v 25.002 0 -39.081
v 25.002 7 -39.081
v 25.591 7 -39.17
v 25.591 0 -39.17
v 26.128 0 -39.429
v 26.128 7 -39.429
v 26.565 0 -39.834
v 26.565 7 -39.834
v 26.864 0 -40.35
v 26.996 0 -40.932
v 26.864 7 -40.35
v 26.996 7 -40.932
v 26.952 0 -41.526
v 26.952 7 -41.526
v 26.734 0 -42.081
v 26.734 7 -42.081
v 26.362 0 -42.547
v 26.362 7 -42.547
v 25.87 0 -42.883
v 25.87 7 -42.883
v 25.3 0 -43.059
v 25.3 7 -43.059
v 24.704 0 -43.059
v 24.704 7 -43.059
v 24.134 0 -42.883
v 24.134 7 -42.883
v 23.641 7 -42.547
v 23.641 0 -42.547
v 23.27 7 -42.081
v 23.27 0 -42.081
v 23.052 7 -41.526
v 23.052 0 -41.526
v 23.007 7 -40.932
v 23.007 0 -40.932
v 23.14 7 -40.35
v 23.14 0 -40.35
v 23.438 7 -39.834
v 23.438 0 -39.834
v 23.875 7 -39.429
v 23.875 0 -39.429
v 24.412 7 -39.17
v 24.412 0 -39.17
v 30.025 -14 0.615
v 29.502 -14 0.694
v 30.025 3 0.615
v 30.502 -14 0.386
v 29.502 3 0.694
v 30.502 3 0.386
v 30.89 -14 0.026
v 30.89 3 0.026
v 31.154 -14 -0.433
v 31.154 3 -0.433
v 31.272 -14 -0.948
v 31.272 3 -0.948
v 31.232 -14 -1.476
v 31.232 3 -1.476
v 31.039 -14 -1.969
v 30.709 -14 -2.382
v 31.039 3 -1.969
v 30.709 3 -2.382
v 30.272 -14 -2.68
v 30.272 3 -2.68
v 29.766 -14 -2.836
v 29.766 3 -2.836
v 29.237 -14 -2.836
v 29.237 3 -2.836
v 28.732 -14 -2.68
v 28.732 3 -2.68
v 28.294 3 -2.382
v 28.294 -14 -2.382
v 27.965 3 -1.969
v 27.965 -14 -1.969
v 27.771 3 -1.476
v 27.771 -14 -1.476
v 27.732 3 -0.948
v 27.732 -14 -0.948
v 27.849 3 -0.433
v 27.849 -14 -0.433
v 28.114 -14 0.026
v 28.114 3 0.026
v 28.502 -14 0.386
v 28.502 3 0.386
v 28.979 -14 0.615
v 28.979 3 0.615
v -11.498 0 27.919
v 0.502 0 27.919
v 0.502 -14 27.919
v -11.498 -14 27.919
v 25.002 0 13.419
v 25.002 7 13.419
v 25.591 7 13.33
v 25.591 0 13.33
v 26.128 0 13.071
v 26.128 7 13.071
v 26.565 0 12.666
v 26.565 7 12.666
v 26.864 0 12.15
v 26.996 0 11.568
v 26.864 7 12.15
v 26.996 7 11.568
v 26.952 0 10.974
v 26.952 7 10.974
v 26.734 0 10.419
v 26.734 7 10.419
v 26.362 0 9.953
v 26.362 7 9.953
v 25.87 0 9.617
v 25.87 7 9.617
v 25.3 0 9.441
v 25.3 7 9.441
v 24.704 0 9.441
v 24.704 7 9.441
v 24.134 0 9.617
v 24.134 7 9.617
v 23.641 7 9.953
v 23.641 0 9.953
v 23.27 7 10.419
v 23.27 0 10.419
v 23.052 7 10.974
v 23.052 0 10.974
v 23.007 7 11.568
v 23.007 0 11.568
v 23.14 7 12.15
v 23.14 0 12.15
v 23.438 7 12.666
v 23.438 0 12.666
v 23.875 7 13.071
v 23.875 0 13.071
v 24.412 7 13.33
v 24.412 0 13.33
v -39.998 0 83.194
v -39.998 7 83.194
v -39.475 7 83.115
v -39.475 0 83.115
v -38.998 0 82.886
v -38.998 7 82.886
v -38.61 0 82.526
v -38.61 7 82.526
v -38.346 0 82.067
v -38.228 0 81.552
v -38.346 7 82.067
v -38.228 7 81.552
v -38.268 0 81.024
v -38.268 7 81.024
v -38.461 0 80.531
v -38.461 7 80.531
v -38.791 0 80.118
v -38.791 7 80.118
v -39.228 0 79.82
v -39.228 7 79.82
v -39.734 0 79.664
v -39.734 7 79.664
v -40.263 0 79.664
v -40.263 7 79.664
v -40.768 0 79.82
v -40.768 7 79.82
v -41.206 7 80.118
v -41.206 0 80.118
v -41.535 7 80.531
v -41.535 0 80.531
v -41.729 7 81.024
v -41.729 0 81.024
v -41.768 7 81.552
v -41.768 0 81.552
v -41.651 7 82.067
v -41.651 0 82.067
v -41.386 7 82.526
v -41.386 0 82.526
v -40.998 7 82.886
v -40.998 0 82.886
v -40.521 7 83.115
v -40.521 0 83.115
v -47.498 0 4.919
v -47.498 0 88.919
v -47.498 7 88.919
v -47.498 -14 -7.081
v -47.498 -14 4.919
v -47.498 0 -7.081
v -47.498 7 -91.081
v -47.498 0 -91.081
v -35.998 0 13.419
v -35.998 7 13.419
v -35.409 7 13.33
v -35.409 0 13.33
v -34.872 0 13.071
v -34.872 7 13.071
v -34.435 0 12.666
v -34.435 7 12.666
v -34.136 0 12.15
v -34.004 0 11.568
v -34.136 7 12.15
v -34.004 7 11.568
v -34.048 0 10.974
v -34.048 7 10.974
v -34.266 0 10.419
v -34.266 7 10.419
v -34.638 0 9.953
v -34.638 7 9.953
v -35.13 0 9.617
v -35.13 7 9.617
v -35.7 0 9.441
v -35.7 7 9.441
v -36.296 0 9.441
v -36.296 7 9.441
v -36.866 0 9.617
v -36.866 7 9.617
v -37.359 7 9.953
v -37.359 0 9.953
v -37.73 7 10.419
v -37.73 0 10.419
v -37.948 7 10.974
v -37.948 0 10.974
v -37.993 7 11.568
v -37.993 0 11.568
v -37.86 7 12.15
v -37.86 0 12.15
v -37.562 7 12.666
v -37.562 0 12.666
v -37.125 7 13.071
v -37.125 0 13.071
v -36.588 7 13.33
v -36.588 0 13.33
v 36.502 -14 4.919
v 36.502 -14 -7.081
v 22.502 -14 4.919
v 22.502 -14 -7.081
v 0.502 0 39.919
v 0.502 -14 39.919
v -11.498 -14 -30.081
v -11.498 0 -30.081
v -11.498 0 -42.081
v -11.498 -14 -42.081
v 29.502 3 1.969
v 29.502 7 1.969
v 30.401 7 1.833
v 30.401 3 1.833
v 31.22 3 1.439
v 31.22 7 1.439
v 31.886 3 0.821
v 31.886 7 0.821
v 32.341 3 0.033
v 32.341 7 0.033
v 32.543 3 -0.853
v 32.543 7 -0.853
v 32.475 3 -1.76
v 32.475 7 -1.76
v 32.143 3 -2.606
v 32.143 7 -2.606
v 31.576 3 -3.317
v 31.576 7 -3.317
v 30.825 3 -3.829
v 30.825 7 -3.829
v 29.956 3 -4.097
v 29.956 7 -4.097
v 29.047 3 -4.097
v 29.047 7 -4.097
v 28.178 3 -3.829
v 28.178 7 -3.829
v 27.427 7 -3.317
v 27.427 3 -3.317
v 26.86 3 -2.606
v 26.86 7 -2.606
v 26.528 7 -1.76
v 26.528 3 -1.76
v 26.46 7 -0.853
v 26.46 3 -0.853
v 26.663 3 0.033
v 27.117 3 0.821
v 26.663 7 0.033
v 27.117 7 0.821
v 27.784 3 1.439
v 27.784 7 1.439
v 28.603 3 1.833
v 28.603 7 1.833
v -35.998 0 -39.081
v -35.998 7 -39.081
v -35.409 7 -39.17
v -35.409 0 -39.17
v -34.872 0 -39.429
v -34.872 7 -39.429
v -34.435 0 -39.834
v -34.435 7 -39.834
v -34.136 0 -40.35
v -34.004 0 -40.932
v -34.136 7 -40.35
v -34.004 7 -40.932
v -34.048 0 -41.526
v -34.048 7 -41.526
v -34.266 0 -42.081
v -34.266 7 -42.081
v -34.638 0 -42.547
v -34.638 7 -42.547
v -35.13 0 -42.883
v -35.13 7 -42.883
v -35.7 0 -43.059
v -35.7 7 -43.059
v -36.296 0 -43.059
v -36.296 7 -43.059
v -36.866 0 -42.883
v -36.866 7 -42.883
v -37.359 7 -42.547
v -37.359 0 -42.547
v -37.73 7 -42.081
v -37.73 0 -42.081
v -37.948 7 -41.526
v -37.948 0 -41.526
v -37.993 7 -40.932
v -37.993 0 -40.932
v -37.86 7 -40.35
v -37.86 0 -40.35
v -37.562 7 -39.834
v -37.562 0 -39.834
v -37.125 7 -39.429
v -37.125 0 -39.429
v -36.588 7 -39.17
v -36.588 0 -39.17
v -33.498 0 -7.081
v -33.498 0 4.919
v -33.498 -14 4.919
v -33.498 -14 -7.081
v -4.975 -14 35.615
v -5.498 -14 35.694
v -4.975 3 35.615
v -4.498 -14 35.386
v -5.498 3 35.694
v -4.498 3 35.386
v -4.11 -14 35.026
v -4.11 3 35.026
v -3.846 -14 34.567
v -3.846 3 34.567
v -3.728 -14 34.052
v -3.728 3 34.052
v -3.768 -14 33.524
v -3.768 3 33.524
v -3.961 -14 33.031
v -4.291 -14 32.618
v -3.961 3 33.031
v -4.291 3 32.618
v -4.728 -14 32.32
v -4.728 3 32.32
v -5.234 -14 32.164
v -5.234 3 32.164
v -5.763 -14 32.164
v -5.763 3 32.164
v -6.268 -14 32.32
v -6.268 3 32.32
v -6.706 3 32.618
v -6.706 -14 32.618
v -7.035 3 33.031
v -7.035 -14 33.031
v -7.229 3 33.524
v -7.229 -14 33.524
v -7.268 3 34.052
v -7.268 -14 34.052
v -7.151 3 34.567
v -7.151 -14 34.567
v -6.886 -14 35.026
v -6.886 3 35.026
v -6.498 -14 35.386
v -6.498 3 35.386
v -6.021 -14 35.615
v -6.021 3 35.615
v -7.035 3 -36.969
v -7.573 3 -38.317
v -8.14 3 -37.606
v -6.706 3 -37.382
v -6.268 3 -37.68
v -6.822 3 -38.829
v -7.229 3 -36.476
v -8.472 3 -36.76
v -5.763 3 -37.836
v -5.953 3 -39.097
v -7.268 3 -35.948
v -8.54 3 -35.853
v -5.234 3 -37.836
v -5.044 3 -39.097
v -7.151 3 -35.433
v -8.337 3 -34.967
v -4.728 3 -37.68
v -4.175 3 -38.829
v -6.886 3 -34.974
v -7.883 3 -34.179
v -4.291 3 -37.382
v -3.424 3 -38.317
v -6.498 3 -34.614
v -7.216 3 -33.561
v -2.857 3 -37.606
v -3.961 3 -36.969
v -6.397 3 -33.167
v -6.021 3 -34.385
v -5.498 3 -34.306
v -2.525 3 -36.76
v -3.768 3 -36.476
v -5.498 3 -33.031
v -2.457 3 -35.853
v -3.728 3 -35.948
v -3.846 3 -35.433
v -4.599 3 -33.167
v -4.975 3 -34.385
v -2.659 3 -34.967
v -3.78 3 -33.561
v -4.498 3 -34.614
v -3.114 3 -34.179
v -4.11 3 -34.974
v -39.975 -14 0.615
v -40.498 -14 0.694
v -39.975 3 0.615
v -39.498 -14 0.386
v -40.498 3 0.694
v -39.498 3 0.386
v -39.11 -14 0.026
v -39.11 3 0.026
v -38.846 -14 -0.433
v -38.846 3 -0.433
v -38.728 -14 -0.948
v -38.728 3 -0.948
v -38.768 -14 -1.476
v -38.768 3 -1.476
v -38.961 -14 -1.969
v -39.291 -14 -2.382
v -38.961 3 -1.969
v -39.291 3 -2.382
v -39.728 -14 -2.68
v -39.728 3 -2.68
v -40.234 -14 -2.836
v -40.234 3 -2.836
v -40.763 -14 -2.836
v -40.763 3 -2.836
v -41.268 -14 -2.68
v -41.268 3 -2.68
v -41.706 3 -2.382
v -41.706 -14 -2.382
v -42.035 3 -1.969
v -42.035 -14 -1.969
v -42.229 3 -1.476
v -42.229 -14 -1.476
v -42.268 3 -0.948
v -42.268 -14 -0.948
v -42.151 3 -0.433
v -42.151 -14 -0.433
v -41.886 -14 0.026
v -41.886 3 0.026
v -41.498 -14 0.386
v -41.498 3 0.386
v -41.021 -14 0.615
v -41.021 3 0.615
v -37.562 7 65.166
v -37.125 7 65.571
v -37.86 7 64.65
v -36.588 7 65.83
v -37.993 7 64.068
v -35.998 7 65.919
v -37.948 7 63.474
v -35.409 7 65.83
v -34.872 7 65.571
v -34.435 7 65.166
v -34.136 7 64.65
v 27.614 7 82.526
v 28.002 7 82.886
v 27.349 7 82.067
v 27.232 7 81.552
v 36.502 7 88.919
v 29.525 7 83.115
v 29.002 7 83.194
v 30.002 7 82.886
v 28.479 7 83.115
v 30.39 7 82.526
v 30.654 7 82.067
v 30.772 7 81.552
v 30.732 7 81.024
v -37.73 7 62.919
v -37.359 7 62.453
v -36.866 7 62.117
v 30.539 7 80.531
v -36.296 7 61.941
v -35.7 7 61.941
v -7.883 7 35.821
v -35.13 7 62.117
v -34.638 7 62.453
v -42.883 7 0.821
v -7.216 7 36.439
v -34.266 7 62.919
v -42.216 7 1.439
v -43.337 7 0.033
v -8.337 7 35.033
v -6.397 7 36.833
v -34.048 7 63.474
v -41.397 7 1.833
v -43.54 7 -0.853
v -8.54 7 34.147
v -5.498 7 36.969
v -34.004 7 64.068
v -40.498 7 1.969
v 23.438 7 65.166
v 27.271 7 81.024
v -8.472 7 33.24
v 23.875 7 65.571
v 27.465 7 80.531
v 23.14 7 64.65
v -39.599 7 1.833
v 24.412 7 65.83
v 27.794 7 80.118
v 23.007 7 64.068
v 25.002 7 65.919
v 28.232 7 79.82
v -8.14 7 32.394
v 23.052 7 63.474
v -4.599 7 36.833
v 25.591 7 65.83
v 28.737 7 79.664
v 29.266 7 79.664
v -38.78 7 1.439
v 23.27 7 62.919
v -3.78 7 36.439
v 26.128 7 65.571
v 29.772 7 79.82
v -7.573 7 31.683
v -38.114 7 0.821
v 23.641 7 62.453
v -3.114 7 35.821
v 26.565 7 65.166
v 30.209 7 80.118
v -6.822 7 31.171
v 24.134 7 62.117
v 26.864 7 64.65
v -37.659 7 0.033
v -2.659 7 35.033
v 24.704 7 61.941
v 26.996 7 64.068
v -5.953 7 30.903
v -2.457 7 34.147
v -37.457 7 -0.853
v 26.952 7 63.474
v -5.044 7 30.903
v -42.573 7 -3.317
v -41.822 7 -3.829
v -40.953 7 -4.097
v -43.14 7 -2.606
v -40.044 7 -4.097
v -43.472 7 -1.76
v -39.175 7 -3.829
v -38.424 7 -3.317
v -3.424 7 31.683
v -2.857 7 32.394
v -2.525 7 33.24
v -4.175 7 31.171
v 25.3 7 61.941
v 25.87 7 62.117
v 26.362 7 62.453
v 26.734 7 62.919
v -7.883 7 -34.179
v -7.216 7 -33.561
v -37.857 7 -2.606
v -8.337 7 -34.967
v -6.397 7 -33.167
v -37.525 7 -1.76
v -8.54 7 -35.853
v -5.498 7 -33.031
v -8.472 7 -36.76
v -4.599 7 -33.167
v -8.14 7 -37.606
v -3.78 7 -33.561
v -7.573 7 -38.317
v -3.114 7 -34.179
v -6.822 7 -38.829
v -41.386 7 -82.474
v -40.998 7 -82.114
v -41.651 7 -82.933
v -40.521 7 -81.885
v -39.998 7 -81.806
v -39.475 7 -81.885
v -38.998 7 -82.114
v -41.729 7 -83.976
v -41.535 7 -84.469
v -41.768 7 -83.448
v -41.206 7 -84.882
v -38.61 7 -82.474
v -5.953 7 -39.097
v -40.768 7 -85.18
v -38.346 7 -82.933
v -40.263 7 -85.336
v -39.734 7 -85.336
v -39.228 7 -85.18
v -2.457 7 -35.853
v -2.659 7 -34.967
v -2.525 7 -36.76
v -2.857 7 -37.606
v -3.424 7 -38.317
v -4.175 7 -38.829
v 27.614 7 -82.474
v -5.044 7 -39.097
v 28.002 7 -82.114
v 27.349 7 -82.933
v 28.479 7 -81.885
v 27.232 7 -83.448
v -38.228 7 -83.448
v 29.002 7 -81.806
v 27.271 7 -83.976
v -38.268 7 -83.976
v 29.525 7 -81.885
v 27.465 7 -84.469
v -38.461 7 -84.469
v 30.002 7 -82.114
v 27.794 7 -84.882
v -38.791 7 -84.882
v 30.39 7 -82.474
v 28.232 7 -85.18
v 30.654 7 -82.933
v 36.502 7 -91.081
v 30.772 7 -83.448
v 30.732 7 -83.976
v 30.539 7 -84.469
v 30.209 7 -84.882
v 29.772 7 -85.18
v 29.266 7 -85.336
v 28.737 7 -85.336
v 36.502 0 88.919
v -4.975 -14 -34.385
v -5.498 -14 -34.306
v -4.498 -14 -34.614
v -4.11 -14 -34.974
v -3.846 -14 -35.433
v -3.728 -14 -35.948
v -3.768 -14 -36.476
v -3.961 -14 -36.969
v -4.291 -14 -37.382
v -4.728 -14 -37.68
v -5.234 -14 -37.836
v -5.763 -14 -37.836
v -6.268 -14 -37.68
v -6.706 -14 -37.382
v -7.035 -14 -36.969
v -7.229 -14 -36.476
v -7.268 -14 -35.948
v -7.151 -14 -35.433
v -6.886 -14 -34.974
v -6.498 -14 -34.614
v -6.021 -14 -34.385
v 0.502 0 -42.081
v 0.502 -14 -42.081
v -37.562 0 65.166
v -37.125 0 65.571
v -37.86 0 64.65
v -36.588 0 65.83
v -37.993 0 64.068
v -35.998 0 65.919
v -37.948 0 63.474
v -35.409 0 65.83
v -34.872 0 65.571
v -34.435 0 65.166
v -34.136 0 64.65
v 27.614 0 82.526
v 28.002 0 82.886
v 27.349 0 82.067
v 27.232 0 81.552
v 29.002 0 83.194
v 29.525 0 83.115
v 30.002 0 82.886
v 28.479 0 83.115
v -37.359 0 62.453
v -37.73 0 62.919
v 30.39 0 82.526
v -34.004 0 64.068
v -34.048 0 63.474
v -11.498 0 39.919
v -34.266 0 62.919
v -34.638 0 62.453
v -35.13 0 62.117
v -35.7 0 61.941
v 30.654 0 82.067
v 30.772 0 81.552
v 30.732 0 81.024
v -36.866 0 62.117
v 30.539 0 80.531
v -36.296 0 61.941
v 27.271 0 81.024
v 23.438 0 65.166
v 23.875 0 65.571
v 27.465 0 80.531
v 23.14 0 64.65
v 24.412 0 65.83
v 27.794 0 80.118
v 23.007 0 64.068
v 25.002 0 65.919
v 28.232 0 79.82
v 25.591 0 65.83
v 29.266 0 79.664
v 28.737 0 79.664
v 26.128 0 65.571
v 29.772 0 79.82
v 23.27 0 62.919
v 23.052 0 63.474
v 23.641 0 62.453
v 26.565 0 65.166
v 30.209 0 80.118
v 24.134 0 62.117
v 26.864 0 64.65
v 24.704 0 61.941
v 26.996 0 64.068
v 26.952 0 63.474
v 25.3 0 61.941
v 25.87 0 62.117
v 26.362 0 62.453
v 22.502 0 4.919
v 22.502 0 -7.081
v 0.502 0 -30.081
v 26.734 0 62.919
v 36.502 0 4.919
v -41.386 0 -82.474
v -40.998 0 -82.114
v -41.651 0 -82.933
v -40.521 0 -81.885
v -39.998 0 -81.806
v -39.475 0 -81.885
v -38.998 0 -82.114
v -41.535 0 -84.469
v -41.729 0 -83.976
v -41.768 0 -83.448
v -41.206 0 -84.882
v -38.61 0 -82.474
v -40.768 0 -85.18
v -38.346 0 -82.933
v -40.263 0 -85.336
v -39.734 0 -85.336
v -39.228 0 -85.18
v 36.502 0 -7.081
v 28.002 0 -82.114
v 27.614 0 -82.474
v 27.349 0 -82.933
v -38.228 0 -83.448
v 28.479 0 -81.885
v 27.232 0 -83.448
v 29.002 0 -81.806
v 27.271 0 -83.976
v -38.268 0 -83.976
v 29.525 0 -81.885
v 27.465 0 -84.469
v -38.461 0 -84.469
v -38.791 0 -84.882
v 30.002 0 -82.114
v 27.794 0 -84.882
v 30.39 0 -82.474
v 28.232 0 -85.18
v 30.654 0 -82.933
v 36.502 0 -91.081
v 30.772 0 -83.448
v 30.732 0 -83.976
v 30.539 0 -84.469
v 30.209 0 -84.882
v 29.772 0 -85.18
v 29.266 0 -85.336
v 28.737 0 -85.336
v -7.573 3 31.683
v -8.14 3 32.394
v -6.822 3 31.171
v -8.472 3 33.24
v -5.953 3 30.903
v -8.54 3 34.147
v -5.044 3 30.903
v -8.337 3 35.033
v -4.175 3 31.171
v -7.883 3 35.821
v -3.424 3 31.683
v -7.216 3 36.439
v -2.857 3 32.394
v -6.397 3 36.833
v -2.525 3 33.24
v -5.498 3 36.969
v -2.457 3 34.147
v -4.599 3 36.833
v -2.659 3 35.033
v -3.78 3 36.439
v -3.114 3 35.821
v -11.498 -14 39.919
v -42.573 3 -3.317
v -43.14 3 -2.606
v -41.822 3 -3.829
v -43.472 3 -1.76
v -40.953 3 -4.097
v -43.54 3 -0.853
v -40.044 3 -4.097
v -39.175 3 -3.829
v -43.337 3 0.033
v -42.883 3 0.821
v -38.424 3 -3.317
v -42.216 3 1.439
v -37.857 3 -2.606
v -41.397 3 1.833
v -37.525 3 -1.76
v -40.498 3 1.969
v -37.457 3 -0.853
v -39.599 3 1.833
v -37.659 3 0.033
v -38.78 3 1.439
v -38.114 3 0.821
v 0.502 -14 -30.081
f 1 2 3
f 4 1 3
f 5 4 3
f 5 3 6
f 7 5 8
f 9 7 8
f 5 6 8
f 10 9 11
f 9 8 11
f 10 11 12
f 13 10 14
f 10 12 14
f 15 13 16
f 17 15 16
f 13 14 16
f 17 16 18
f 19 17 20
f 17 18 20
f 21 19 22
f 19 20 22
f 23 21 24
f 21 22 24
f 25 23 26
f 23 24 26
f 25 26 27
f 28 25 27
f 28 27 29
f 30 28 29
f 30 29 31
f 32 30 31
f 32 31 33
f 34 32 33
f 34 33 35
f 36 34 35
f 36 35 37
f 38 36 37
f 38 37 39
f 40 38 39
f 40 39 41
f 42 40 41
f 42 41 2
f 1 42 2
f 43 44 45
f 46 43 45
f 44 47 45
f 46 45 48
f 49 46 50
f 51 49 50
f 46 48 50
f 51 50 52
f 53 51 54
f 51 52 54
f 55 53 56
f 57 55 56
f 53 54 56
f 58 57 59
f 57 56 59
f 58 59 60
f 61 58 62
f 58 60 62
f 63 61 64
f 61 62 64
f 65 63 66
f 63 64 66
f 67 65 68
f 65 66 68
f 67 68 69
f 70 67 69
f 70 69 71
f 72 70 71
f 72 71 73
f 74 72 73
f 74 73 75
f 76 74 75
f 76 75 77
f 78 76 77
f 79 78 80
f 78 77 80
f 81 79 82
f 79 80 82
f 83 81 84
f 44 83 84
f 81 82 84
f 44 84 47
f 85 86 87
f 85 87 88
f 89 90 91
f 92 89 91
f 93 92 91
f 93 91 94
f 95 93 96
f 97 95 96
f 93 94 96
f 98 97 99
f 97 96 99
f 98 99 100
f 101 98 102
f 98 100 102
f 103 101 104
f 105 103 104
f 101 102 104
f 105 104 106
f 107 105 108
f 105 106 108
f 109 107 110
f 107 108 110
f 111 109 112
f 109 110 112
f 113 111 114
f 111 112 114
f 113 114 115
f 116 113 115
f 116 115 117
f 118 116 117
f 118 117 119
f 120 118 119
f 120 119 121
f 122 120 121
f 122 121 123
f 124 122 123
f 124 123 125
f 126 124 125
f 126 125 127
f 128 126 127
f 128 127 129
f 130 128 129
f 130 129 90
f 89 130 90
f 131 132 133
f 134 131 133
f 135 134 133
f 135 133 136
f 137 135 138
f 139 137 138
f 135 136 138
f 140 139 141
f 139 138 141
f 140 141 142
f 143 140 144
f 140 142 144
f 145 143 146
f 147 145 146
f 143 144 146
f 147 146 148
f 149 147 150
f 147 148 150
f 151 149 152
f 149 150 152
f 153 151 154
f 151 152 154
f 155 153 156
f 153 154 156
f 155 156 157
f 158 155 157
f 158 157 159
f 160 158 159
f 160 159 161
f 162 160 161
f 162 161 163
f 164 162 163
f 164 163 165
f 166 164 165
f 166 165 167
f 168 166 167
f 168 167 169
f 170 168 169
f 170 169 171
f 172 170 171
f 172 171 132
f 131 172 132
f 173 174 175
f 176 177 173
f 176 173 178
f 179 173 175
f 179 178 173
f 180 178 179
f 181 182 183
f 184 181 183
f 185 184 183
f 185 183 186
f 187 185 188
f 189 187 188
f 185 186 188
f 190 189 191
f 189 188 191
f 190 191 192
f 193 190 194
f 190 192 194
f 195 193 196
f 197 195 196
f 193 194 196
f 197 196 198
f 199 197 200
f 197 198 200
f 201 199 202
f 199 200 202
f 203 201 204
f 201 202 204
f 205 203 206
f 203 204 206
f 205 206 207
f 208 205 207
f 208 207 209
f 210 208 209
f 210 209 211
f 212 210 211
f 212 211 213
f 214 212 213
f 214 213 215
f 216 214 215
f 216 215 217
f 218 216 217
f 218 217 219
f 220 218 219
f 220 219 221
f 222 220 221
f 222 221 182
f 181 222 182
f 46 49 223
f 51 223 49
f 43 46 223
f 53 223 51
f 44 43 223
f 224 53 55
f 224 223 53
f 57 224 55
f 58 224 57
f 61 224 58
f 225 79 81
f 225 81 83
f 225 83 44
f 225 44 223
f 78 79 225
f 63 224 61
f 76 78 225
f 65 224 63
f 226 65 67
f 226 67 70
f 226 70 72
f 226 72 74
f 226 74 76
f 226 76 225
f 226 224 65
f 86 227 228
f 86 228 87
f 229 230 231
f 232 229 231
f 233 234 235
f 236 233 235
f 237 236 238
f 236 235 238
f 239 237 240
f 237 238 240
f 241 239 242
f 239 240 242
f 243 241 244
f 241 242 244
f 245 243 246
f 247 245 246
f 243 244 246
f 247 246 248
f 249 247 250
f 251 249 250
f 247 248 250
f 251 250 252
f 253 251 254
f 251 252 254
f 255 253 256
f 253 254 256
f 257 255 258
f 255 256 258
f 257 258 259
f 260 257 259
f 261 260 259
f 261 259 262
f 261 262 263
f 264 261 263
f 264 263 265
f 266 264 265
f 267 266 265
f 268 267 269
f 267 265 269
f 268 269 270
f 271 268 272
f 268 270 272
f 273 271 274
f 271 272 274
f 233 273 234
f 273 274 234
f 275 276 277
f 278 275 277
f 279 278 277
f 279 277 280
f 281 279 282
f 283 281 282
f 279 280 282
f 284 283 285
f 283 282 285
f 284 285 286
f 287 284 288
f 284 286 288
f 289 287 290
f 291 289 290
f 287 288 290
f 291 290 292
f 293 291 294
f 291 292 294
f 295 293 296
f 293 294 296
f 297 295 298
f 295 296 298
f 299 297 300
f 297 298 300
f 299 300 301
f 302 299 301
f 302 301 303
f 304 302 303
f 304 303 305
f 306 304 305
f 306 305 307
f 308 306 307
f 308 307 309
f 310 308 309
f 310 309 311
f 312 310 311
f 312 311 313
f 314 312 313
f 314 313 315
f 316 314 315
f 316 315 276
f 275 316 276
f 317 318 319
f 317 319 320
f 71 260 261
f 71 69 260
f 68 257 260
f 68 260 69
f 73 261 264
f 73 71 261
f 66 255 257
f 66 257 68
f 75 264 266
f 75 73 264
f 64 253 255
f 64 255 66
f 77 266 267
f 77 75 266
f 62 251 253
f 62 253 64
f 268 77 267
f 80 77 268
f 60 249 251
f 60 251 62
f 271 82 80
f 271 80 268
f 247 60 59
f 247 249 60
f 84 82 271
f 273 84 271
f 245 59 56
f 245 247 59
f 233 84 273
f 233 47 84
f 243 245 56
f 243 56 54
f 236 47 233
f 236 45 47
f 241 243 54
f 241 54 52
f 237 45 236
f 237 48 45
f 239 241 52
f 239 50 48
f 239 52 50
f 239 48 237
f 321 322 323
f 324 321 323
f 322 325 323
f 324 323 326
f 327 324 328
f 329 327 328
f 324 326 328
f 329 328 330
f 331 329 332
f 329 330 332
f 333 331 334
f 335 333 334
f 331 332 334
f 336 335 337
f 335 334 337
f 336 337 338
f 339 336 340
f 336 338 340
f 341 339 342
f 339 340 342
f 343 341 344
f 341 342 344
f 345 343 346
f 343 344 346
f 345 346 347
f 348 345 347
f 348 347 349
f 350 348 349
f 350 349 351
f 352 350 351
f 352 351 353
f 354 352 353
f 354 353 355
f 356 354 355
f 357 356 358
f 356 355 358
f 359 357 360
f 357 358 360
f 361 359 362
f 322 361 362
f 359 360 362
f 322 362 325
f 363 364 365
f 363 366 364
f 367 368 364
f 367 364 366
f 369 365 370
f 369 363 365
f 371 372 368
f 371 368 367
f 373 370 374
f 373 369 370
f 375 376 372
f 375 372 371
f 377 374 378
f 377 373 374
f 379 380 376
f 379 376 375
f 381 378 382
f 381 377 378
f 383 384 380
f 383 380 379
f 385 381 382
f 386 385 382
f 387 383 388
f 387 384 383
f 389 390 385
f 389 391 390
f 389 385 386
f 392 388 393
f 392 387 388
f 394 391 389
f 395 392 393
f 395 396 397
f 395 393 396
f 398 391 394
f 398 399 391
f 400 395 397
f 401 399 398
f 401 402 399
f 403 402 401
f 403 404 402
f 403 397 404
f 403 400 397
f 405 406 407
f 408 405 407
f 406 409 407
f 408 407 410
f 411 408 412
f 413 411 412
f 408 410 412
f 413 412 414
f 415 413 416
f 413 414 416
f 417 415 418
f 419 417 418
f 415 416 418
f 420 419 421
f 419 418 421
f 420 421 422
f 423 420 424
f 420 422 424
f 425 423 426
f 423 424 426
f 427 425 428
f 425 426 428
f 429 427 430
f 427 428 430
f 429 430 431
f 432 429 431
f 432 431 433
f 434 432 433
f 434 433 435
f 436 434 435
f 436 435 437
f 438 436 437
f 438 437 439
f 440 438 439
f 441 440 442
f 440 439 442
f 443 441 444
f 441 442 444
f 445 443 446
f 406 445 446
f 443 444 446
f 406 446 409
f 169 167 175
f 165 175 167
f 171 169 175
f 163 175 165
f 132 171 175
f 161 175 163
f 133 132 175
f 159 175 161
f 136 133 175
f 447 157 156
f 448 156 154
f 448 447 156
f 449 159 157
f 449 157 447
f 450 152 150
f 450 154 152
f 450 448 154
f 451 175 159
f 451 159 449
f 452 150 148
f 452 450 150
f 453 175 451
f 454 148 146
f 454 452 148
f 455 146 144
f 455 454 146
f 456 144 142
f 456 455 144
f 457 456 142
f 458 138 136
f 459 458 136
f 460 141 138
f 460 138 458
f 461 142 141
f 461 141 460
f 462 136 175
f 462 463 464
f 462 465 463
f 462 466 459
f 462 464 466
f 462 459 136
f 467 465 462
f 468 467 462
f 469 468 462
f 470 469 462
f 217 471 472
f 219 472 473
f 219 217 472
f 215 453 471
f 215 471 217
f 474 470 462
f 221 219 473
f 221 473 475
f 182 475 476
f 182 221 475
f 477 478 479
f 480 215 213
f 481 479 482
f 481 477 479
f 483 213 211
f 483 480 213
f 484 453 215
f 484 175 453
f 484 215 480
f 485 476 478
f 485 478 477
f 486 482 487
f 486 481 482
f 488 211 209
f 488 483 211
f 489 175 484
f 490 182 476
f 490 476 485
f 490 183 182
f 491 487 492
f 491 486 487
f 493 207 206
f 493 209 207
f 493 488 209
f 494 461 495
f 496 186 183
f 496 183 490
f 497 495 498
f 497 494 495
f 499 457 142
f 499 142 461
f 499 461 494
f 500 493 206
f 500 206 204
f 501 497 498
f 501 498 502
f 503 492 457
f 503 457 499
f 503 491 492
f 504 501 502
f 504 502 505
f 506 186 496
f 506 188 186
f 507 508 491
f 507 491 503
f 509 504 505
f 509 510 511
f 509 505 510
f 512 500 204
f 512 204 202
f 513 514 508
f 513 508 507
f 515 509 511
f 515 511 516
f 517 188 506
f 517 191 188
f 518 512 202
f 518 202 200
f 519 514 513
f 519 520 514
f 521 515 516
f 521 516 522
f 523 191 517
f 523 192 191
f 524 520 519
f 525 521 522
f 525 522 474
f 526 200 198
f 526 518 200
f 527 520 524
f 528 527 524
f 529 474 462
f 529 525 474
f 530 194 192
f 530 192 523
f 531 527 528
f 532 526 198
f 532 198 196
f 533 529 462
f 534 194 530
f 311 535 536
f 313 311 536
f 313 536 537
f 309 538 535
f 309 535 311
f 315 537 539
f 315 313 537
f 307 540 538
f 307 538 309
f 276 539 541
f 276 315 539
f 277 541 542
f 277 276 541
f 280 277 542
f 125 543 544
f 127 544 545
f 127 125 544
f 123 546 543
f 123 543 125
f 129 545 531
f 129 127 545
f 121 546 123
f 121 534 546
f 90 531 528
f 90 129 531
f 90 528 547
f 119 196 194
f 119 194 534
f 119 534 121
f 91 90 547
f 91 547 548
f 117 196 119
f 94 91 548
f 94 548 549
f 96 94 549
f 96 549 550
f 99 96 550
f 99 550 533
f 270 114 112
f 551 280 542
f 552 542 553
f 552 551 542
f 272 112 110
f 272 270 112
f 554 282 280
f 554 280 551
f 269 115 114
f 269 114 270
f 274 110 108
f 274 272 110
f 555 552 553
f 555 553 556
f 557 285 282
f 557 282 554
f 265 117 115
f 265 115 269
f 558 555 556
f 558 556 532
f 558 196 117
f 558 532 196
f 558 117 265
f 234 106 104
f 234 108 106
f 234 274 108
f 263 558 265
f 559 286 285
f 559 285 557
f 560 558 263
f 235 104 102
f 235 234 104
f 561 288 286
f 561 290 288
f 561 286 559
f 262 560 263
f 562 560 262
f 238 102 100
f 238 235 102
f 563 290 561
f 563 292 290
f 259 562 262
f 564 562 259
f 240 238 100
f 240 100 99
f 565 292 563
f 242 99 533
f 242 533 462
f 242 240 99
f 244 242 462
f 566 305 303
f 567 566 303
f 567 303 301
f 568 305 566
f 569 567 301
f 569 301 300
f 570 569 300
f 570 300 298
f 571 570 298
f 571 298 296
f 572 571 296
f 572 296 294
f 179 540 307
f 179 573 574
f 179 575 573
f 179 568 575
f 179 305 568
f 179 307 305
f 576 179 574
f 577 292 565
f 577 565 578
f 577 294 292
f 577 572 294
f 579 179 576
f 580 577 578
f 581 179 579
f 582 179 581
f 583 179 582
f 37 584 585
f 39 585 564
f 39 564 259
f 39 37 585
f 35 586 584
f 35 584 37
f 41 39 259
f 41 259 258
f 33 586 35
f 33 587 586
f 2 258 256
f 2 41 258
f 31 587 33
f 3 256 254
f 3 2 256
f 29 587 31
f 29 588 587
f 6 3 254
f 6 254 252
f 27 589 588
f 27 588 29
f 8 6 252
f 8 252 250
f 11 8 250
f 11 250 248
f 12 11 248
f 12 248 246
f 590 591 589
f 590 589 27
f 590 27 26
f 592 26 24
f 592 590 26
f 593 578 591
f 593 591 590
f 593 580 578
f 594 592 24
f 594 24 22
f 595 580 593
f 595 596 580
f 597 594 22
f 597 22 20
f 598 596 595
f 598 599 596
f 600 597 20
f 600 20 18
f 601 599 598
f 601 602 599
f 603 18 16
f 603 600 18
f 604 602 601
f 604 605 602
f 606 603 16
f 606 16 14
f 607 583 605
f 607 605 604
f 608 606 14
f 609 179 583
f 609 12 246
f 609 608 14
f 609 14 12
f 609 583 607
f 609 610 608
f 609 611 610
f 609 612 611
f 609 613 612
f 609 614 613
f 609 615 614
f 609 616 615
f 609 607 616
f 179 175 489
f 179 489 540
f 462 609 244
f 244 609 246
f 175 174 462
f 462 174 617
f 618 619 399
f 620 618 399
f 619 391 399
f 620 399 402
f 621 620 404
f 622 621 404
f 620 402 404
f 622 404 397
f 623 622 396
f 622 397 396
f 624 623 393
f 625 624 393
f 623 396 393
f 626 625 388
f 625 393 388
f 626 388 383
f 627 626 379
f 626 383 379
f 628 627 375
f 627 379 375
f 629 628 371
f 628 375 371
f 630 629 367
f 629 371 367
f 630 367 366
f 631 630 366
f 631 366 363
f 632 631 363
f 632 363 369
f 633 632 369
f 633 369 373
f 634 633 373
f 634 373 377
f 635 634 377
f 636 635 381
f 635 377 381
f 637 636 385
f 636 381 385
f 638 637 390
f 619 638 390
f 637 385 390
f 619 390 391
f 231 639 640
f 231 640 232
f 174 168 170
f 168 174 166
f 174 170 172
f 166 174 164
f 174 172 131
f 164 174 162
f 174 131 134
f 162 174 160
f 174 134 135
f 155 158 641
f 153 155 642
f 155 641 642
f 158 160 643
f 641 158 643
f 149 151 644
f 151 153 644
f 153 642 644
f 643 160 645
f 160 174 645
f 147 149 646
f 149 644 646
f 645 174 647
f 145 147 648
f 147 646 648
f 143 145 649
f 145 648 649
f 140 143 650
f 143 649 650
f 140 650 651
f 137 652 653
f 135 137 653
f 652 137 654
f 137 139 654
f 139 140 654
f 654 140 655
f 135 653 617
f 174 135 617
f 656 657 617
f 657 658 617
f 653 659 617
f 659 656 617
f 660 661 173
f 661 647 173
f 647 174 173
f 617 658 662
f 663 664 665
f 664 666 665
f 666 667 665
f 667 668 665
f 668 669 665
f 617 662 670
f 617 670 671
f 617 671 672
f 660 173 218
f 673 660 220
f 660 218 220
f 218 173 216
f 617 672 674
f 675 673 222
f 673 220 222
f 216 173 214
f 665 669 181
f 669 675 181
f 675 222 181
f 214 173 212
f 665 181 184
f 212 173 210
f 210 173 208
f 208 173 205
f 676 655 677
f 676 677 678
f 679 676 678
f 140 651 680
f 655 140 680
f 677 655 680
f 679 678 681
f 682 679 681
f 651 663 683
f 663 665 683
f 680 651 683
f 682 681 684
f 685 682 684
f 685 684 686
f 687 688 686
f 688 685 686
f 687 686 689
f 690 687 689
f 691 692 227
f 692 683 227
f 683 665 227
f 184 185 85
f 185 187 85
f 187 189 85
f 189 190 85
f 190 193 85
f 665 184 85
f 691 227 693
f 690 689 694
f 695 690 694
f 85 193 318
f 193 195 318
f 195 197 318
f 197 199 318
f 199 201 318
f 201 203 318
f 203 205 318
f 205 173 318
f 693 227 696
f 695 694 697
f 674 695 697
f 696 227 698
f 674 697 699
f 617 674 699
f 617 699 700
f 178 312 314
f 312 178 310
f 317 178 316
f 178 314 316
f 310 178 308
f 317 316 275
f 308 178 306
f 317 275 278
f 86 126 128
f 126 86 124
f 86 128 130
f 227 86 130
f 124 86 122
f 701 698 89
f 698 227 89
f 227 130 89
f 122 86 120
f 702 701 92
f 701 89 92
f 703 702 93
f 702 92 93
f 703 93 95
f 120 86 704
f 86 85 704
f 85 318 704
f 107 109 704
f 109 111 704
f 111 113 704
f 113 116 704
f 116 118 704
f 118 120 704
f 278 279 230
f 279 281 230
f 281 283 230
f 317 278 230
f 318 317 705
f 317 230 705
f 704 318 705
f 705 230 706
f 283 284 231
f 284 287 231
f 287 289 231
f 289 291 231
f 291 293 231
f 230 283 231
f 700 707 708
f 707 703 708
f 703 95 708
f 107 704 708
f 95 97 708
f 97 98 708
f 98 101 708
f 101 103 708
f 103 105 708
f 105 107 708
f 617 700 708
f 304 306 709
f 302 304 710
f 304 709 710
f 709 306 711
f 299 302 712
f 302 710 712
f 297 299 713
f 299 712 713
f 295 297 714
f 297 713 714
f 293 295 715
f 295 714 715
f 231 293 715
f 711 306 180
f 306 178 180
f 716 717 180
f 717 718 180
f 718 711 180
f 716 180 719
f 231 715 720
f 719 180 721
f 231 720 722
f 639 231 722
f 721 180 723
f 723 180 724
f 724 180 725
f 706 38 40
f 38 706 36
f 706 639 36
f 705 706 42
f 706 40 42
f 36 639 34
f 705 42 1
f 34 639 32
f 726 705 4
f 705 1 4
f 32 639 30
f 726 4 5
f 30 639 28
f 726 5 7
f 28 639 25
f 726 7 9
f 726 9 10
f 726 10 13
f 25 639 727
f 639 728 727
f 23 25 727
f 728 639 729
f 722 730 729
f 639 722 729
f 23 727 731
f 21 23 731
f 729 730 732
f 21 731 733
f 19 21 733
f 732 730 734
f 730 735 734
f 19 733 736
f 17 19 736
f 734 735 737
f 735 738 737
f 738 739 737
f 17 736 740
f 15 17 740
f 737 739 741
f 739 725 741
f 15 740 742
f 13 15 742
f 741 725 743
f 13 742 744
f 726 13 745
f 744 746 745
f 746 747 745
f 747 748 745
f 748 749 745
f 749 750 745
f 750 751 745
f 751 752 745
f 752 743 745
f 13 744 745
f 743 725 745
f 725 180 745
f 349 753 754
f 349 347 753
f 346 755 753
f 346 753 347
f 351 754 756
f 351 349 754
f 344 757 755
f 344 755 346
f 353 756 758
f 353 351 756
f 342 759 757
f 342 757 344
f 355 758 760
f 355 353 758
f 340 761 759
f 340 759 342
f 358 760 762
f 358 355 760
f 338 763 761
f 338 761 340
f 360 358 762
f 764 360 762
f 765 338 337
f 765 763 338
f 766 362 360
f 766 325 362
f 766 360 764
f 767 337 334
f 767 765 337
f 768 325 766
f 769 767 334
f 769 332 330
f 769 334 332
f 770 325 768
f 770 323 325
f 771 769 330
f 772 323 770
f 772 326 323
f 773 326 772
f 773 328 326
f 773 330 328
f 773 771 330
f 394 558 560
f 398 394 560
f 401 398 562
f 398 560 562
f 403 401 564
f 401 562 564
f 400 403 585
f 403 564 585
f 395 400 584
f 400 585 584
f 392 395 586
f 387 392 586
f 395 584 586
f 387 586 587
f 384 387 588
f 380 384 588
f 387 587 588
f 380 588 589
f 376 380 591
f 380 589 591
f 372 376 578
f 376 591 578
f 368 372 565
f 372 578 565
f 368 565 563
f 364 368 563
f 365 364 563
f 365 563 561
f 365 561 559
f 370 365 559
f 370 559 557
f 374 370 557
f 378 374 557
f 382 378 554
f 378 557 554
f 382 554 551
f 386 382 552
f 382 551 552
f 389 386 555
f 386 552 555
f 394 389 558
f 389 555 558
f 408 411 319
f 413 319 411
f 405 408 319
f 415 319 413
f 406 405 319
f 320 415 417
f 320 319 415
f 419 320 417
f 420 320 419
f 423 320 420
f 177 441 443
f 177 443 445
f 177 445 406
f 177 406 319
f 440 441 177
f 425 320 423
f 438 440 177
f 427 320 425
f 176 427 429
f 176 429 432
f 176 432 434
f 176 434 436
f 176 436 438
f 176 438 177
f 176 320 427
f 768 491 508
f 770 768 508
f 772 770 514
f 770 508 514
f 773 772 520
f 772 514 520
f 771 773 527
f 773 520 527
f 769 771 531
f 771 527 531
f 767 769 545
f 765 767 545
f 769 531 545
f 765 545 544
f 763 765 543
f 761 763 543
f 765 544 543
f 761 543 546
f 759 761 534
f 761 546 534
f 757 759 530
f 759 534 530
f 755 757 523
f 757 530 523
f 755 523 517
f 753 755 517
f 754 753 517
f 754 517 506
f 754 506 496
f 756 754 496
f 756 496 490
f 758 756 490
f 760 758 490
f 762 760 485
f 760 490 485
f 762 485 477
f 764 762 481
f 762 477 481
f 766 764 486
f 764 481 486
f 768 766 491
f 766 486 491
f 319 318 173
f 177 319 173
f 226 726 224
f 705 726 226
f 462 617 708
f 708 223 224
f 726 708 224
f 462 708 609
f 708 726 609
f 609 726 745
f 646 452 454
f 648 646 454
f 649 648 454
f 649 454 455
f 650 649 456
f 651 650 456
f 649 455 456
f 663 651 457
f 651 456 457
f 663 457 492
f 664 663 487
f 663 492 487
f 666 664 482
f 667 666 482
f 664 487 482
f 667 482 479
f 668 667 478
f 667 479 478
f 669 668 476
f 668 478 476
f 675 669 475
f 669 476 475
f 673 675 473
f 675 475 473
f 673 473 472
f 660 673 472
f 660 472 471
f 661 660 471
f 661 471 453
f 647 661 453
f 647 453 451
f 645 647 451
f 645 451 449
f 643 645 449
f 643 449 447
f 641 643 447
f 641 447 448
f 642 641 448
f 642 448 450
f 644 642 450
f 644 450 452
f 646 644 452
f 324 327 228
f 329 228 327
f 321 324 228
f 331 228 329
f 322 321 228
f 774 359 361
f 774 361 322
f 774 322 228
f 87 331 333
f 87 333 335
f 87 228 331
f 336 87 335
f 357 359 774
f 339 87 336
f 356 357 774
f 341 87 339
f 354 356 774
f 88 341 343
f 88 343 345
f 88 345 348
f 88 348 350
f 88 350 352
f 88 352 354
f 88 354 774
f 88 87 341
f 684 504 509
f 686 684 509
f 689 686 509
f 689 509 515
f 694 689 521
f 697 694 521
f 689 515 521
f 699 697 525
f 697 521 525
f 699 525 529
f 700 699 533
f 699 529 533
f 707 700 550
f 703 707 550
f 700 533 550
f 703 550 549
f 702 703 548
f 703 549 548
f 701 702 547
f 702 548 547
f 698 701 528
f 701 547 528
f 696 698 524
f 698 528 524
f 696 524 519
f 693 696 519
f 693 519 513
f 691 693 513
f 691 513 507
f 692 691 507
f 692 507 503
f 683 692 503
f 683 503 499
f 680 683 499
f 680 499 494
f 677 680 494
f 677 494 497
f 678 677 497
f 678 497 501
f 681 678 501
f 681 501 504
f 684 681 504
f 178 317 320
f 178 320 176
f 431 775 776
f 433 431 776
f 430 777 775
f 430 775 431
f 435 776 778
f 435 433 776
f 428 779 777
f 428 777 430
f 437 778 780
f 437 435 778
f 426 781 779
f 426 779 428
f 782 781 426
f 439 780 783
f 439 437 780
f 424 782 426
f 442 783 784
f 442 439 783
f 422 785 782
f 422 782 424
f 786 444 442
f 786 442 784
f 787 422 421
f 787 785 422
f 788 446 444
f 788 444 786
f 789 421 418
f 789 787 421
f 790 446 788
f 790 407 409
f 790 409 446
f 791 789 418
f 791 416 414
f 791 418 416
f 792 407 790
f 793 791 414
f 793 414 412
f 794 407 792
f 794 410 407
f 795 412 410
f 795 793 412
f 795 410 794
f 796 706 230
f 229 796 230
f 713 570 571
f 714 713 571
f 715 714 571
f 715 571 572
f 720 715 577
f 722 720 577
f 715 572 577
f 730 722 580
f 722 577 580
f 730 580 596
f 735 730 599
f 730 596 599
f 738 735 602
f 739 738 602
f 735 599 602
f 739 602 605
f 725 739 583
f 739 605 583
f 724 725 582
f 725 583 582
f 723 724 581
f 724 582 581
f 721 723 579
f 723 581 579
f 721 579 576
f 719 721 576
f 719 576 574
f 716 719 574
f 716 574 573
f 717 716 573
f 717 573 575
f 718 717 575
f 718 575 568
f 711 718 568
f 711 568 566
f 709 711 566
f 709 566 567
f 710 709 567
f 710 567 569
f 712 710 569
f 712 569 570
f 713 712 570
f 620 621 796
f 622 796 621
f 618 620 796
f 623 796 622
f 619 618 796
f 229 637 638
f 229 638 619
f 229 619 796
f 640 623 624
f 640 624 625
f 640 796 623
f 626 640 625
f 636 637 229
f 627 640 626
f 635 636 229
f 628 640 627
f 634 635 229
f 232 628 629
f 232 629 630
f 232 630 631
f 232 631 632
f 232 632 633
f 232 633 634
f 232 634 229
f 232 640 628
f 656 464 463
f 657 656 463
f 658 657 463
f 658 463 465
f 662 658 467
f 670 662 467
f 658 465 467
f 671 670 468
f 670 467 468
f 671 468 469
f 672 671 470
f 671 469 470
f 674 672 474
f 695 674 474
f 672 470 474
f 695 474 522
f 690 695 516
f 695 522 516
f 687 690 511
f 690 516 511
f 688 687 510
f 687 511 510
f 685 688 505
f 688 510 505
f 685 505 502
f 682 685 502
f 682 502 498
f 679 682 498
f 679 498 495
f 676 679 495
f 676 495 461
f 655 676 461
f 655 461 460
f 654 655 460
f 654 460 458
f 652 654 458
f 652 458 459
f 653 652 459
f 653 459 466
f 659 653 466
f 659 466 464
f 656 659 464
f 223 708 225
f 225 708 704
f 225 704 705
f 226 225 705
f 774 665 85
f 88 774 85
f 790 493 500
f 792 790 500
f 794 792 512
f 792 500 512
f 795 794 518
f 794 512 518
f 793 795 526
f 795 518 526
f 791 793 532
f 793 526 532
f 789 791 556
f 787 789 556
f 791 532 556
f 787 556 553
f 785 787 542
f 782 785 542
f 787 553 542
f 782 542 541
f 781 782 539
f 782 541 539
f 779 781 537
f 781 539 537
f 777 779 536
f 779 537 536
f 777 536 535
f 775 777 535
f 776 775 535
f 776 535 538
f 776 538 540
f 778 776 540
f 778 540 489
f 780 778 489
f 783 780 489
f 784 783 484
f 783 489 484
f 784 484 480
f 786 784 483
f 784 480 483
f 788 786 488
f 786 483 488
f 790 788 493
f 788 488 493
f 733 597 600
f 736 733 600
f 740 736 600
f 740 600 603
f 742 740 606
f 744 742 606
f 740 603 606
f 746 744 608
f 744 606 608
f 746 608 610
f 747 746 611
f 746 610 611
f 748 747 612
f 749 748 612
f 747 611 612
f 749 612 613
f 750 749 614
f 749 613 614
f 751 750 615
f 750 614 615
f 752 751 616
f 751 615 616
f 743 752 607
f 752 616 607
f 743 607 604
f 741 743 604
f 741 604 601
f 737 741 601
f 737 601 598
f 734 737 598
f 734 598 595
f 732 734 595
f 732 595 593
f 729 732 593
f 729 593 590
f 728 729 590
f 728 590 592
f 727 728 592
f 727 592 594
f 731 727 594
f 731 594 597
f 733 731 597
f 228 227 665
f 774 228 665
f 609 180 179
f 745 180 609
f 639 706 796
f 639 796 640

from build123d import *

# Parameters (mm, degrees)
SKETCH1_W           = 84
SKETCH1_H           = 180
BOSS_EXTRUDE1_DEPTH = 7
SKETCH2_R           = 1.775
CUT_EXTRUDE1_DEPTH  = 103.960355362
SKETCH3_R           = 3.05
CUT_EXTRUDE2_DEPTH  = 4
SKETCH5_W           = 12
SKETCH5_H           = 12
SKETCH5_W_2         = 14
BOSS_EXTRUDE2_DEPTH = 14
SKETCH6_R           = 1.775
CUT_EXTRUDE3_DEPTH  = 105.846720389
SKETCH7_R           = 2
CUT_EXTRUDE4_DEPTH  = 105.846720389
SKETCH8_R           = 1.775
CUT_EXTRUDE5_DEPTH  = 105.846720389


with BuildPart() as part:
    # Sketch1 → Boss-Extrude1 (new body)
    with BuildSketch(Plane(origin=(0, 0, 0), x_dir=(1, 0, 0), z_dir=(0, 1, 0))):
        with Locations((-5.498242658, 1.081017345)):
            Rectangle(SKETCH1_W, SKETCH1_H)
    extrude(amount=BOSS_EXTRUDE1_DEPTH)

    # Sketch2 → Cut-Extrude1 (cut, through all)
    with BuildSketch(Plane(origin=(0, 7, 0), x_dir=(1, 0, 0), z_dir=(0, 1, 0))):
        with Locations(Location((-40.498242658, 1.081017345, 0), (0, 0, 270))):
            Circle(SKETCH2_R)
        with Locations(Location((-5.498242658, -33.918982655, 0), (0, 0, 270))):
            Circle(SKETCH2_R)
        with Locations(Location((29.501757342, 1.081017345, 0), (0, 0, 270))):
            Circle(SKETCH2_R)
        with Locations(Location((-5.498242658, 36.081017345, 0), (0, 0, 270))):
            Circle(SKETCH2_R)
    extrude(amount=-CUT_EXTRUDE1_DEPTH, mode=Mode.SUBTRACT)

    # Sketch3 → Cut-Extrude2 (cut)
    with BuildSketch(Plane(origin=(0, 7, 0), x_dir=(1, 0, 0), z_dir=(0, 1, 0))):
        with Locations(Location((-40.498242658, 1.081017345, 0), (0, 0, 270))):
            Circle(SKETCH3_R)
        with Locations(Location((-5.498242658, -33.918982655, 0), (0, 0, 270))):
            Circle(SKETCH3_R)
        with Locations(Location((-5.498242658, 36.081017345, 0), (0, 0, 270))):
            Circle(SKETCH3_R)
        with Locations(Location((29.501757342, 1.081017345, 0), (0, 0, 270))):
            Circle(SKETCH3_R)
    extrude(amount=-CUT_EXTRUDE2_DEPTH, mode=Mode.SUBTRACT)

    # Sketch5 → Boss-Extrude2 (add)
    with BuildSketch(Plane(origin=(0, 0, 0), x_dir=(-1, 0, 0), z_dir=(0, -1, 0))):
        with Locations((5.498242658, -33.918982655)):
            Rectangle(SKETCH5_W, SKETCH5_H)
        with Locations((40.498242658, 1.081017345)):
            Rectangle(SKETCH5_W_2, SKETCH5_H)
        with Locations((5.498242658, 36.081017345)):
            Rectangle(SKETCH5_W, SKETCH5_H)
        with Locations((-29.501757342, 1.081017345)):
            Rectangle(SKETCH5_W_2, SKETCH5_H)
    extrude(amount=BOSS_EXTRUDE2_DEPTH)

    # Sketch6 → Cut-Extrude3 (cut, through all)
    with BuildSketch(Plane(origin=(0, 7, 0), x_dir=(1, 0, 0), z_dir=(0, 1, 0))):
        with Locations(Location((-40.498242658, 1.081017345, 0), (0, 0, 270))):
            Circle(SKETCH6_R)
        with Locations(Location((29.501757342, 1.081017345, 0), (0, 0, 270))):
            Circle(SKETCH6_R)
        with Locations(Location((-5.498242658, -33.918982655, 0), (0, 0, 270))):
            Circle(SKETCH6_R)
        with Locations(Location((-5.498242658, 36.081017345, 0), (0, 0, 270))):
            Circle(SKETCH6_R)
    extrude(amount=-CUT_EXTRUDE3_DEPTH, mode=Mode.SUBTRACT)

    # Sketch7 → Cut-Extrude4 (cut, through all)
    with BuildSketch(Plane(origin=(0, 7, 0), x_dir=(1, 0, 0), z_dir=(0, 1, 0))):
        with Locations(Location((-35.998242658, -63.918982655, 0), (0, 0, 270))):
            Circle(SKETCH7_R)
        with Locations(Location((-35.998242658, -11.418982655, 0), (0, 0, 270))):
            Circle(SKETCH7_R)
        with Locations(Location((-35.998242658, 41.081017345, 0), (0, 0, 270))):
            Circle(SKETCH7_R)
        with Locations(Location((25.001757342, -63.918982655, 0), (0, 0, 270))):
            Circle(SKETCH7_R)
        with Locations(Location((25.001757342, -11.418982655, 0), (0, 0, 270))):
            Circle(SKETCH7_R)
        with Locations(Location((25.001757342, 41.081017345, 0), (0, 0, 270))):
            Circle(SKETCH7_R)
    extrude(amount=-CUT_EXTRUDE4_DEPTH, mode=Mode.SUBTRACT)

    # Sketch8 → Cut-Extrude5 (cut, through all)
    with BuildSketch(Plane(origin=(0, 7, 0), x_dir=(1, 0, 0), z_dir=(0, 1, 0))):
        with Locations(Location((-39.998242658, -81.418982655, 0), (0, 0, 270))):
            Circle(SKETCH8_R)
        with Locations(Location((-39.998242658, 83.581017345, 0), (0, 0, 270))):
            Circle(SKETCH8_R)
        with Locations(Location((29.001757342, 83.581017345, 0), (0, 0, 270))):
            Circle(SKETCH8_R)
        with Locations(Location((29.001757342, -81.418982655, 0), (0, 0, 270))):
            Circle(SKETCH8_R)
    extrude(amount=-CUT_EXTRUDE5_DEPTH, mode=Mode.SUBTRACT)


solid = part.part
